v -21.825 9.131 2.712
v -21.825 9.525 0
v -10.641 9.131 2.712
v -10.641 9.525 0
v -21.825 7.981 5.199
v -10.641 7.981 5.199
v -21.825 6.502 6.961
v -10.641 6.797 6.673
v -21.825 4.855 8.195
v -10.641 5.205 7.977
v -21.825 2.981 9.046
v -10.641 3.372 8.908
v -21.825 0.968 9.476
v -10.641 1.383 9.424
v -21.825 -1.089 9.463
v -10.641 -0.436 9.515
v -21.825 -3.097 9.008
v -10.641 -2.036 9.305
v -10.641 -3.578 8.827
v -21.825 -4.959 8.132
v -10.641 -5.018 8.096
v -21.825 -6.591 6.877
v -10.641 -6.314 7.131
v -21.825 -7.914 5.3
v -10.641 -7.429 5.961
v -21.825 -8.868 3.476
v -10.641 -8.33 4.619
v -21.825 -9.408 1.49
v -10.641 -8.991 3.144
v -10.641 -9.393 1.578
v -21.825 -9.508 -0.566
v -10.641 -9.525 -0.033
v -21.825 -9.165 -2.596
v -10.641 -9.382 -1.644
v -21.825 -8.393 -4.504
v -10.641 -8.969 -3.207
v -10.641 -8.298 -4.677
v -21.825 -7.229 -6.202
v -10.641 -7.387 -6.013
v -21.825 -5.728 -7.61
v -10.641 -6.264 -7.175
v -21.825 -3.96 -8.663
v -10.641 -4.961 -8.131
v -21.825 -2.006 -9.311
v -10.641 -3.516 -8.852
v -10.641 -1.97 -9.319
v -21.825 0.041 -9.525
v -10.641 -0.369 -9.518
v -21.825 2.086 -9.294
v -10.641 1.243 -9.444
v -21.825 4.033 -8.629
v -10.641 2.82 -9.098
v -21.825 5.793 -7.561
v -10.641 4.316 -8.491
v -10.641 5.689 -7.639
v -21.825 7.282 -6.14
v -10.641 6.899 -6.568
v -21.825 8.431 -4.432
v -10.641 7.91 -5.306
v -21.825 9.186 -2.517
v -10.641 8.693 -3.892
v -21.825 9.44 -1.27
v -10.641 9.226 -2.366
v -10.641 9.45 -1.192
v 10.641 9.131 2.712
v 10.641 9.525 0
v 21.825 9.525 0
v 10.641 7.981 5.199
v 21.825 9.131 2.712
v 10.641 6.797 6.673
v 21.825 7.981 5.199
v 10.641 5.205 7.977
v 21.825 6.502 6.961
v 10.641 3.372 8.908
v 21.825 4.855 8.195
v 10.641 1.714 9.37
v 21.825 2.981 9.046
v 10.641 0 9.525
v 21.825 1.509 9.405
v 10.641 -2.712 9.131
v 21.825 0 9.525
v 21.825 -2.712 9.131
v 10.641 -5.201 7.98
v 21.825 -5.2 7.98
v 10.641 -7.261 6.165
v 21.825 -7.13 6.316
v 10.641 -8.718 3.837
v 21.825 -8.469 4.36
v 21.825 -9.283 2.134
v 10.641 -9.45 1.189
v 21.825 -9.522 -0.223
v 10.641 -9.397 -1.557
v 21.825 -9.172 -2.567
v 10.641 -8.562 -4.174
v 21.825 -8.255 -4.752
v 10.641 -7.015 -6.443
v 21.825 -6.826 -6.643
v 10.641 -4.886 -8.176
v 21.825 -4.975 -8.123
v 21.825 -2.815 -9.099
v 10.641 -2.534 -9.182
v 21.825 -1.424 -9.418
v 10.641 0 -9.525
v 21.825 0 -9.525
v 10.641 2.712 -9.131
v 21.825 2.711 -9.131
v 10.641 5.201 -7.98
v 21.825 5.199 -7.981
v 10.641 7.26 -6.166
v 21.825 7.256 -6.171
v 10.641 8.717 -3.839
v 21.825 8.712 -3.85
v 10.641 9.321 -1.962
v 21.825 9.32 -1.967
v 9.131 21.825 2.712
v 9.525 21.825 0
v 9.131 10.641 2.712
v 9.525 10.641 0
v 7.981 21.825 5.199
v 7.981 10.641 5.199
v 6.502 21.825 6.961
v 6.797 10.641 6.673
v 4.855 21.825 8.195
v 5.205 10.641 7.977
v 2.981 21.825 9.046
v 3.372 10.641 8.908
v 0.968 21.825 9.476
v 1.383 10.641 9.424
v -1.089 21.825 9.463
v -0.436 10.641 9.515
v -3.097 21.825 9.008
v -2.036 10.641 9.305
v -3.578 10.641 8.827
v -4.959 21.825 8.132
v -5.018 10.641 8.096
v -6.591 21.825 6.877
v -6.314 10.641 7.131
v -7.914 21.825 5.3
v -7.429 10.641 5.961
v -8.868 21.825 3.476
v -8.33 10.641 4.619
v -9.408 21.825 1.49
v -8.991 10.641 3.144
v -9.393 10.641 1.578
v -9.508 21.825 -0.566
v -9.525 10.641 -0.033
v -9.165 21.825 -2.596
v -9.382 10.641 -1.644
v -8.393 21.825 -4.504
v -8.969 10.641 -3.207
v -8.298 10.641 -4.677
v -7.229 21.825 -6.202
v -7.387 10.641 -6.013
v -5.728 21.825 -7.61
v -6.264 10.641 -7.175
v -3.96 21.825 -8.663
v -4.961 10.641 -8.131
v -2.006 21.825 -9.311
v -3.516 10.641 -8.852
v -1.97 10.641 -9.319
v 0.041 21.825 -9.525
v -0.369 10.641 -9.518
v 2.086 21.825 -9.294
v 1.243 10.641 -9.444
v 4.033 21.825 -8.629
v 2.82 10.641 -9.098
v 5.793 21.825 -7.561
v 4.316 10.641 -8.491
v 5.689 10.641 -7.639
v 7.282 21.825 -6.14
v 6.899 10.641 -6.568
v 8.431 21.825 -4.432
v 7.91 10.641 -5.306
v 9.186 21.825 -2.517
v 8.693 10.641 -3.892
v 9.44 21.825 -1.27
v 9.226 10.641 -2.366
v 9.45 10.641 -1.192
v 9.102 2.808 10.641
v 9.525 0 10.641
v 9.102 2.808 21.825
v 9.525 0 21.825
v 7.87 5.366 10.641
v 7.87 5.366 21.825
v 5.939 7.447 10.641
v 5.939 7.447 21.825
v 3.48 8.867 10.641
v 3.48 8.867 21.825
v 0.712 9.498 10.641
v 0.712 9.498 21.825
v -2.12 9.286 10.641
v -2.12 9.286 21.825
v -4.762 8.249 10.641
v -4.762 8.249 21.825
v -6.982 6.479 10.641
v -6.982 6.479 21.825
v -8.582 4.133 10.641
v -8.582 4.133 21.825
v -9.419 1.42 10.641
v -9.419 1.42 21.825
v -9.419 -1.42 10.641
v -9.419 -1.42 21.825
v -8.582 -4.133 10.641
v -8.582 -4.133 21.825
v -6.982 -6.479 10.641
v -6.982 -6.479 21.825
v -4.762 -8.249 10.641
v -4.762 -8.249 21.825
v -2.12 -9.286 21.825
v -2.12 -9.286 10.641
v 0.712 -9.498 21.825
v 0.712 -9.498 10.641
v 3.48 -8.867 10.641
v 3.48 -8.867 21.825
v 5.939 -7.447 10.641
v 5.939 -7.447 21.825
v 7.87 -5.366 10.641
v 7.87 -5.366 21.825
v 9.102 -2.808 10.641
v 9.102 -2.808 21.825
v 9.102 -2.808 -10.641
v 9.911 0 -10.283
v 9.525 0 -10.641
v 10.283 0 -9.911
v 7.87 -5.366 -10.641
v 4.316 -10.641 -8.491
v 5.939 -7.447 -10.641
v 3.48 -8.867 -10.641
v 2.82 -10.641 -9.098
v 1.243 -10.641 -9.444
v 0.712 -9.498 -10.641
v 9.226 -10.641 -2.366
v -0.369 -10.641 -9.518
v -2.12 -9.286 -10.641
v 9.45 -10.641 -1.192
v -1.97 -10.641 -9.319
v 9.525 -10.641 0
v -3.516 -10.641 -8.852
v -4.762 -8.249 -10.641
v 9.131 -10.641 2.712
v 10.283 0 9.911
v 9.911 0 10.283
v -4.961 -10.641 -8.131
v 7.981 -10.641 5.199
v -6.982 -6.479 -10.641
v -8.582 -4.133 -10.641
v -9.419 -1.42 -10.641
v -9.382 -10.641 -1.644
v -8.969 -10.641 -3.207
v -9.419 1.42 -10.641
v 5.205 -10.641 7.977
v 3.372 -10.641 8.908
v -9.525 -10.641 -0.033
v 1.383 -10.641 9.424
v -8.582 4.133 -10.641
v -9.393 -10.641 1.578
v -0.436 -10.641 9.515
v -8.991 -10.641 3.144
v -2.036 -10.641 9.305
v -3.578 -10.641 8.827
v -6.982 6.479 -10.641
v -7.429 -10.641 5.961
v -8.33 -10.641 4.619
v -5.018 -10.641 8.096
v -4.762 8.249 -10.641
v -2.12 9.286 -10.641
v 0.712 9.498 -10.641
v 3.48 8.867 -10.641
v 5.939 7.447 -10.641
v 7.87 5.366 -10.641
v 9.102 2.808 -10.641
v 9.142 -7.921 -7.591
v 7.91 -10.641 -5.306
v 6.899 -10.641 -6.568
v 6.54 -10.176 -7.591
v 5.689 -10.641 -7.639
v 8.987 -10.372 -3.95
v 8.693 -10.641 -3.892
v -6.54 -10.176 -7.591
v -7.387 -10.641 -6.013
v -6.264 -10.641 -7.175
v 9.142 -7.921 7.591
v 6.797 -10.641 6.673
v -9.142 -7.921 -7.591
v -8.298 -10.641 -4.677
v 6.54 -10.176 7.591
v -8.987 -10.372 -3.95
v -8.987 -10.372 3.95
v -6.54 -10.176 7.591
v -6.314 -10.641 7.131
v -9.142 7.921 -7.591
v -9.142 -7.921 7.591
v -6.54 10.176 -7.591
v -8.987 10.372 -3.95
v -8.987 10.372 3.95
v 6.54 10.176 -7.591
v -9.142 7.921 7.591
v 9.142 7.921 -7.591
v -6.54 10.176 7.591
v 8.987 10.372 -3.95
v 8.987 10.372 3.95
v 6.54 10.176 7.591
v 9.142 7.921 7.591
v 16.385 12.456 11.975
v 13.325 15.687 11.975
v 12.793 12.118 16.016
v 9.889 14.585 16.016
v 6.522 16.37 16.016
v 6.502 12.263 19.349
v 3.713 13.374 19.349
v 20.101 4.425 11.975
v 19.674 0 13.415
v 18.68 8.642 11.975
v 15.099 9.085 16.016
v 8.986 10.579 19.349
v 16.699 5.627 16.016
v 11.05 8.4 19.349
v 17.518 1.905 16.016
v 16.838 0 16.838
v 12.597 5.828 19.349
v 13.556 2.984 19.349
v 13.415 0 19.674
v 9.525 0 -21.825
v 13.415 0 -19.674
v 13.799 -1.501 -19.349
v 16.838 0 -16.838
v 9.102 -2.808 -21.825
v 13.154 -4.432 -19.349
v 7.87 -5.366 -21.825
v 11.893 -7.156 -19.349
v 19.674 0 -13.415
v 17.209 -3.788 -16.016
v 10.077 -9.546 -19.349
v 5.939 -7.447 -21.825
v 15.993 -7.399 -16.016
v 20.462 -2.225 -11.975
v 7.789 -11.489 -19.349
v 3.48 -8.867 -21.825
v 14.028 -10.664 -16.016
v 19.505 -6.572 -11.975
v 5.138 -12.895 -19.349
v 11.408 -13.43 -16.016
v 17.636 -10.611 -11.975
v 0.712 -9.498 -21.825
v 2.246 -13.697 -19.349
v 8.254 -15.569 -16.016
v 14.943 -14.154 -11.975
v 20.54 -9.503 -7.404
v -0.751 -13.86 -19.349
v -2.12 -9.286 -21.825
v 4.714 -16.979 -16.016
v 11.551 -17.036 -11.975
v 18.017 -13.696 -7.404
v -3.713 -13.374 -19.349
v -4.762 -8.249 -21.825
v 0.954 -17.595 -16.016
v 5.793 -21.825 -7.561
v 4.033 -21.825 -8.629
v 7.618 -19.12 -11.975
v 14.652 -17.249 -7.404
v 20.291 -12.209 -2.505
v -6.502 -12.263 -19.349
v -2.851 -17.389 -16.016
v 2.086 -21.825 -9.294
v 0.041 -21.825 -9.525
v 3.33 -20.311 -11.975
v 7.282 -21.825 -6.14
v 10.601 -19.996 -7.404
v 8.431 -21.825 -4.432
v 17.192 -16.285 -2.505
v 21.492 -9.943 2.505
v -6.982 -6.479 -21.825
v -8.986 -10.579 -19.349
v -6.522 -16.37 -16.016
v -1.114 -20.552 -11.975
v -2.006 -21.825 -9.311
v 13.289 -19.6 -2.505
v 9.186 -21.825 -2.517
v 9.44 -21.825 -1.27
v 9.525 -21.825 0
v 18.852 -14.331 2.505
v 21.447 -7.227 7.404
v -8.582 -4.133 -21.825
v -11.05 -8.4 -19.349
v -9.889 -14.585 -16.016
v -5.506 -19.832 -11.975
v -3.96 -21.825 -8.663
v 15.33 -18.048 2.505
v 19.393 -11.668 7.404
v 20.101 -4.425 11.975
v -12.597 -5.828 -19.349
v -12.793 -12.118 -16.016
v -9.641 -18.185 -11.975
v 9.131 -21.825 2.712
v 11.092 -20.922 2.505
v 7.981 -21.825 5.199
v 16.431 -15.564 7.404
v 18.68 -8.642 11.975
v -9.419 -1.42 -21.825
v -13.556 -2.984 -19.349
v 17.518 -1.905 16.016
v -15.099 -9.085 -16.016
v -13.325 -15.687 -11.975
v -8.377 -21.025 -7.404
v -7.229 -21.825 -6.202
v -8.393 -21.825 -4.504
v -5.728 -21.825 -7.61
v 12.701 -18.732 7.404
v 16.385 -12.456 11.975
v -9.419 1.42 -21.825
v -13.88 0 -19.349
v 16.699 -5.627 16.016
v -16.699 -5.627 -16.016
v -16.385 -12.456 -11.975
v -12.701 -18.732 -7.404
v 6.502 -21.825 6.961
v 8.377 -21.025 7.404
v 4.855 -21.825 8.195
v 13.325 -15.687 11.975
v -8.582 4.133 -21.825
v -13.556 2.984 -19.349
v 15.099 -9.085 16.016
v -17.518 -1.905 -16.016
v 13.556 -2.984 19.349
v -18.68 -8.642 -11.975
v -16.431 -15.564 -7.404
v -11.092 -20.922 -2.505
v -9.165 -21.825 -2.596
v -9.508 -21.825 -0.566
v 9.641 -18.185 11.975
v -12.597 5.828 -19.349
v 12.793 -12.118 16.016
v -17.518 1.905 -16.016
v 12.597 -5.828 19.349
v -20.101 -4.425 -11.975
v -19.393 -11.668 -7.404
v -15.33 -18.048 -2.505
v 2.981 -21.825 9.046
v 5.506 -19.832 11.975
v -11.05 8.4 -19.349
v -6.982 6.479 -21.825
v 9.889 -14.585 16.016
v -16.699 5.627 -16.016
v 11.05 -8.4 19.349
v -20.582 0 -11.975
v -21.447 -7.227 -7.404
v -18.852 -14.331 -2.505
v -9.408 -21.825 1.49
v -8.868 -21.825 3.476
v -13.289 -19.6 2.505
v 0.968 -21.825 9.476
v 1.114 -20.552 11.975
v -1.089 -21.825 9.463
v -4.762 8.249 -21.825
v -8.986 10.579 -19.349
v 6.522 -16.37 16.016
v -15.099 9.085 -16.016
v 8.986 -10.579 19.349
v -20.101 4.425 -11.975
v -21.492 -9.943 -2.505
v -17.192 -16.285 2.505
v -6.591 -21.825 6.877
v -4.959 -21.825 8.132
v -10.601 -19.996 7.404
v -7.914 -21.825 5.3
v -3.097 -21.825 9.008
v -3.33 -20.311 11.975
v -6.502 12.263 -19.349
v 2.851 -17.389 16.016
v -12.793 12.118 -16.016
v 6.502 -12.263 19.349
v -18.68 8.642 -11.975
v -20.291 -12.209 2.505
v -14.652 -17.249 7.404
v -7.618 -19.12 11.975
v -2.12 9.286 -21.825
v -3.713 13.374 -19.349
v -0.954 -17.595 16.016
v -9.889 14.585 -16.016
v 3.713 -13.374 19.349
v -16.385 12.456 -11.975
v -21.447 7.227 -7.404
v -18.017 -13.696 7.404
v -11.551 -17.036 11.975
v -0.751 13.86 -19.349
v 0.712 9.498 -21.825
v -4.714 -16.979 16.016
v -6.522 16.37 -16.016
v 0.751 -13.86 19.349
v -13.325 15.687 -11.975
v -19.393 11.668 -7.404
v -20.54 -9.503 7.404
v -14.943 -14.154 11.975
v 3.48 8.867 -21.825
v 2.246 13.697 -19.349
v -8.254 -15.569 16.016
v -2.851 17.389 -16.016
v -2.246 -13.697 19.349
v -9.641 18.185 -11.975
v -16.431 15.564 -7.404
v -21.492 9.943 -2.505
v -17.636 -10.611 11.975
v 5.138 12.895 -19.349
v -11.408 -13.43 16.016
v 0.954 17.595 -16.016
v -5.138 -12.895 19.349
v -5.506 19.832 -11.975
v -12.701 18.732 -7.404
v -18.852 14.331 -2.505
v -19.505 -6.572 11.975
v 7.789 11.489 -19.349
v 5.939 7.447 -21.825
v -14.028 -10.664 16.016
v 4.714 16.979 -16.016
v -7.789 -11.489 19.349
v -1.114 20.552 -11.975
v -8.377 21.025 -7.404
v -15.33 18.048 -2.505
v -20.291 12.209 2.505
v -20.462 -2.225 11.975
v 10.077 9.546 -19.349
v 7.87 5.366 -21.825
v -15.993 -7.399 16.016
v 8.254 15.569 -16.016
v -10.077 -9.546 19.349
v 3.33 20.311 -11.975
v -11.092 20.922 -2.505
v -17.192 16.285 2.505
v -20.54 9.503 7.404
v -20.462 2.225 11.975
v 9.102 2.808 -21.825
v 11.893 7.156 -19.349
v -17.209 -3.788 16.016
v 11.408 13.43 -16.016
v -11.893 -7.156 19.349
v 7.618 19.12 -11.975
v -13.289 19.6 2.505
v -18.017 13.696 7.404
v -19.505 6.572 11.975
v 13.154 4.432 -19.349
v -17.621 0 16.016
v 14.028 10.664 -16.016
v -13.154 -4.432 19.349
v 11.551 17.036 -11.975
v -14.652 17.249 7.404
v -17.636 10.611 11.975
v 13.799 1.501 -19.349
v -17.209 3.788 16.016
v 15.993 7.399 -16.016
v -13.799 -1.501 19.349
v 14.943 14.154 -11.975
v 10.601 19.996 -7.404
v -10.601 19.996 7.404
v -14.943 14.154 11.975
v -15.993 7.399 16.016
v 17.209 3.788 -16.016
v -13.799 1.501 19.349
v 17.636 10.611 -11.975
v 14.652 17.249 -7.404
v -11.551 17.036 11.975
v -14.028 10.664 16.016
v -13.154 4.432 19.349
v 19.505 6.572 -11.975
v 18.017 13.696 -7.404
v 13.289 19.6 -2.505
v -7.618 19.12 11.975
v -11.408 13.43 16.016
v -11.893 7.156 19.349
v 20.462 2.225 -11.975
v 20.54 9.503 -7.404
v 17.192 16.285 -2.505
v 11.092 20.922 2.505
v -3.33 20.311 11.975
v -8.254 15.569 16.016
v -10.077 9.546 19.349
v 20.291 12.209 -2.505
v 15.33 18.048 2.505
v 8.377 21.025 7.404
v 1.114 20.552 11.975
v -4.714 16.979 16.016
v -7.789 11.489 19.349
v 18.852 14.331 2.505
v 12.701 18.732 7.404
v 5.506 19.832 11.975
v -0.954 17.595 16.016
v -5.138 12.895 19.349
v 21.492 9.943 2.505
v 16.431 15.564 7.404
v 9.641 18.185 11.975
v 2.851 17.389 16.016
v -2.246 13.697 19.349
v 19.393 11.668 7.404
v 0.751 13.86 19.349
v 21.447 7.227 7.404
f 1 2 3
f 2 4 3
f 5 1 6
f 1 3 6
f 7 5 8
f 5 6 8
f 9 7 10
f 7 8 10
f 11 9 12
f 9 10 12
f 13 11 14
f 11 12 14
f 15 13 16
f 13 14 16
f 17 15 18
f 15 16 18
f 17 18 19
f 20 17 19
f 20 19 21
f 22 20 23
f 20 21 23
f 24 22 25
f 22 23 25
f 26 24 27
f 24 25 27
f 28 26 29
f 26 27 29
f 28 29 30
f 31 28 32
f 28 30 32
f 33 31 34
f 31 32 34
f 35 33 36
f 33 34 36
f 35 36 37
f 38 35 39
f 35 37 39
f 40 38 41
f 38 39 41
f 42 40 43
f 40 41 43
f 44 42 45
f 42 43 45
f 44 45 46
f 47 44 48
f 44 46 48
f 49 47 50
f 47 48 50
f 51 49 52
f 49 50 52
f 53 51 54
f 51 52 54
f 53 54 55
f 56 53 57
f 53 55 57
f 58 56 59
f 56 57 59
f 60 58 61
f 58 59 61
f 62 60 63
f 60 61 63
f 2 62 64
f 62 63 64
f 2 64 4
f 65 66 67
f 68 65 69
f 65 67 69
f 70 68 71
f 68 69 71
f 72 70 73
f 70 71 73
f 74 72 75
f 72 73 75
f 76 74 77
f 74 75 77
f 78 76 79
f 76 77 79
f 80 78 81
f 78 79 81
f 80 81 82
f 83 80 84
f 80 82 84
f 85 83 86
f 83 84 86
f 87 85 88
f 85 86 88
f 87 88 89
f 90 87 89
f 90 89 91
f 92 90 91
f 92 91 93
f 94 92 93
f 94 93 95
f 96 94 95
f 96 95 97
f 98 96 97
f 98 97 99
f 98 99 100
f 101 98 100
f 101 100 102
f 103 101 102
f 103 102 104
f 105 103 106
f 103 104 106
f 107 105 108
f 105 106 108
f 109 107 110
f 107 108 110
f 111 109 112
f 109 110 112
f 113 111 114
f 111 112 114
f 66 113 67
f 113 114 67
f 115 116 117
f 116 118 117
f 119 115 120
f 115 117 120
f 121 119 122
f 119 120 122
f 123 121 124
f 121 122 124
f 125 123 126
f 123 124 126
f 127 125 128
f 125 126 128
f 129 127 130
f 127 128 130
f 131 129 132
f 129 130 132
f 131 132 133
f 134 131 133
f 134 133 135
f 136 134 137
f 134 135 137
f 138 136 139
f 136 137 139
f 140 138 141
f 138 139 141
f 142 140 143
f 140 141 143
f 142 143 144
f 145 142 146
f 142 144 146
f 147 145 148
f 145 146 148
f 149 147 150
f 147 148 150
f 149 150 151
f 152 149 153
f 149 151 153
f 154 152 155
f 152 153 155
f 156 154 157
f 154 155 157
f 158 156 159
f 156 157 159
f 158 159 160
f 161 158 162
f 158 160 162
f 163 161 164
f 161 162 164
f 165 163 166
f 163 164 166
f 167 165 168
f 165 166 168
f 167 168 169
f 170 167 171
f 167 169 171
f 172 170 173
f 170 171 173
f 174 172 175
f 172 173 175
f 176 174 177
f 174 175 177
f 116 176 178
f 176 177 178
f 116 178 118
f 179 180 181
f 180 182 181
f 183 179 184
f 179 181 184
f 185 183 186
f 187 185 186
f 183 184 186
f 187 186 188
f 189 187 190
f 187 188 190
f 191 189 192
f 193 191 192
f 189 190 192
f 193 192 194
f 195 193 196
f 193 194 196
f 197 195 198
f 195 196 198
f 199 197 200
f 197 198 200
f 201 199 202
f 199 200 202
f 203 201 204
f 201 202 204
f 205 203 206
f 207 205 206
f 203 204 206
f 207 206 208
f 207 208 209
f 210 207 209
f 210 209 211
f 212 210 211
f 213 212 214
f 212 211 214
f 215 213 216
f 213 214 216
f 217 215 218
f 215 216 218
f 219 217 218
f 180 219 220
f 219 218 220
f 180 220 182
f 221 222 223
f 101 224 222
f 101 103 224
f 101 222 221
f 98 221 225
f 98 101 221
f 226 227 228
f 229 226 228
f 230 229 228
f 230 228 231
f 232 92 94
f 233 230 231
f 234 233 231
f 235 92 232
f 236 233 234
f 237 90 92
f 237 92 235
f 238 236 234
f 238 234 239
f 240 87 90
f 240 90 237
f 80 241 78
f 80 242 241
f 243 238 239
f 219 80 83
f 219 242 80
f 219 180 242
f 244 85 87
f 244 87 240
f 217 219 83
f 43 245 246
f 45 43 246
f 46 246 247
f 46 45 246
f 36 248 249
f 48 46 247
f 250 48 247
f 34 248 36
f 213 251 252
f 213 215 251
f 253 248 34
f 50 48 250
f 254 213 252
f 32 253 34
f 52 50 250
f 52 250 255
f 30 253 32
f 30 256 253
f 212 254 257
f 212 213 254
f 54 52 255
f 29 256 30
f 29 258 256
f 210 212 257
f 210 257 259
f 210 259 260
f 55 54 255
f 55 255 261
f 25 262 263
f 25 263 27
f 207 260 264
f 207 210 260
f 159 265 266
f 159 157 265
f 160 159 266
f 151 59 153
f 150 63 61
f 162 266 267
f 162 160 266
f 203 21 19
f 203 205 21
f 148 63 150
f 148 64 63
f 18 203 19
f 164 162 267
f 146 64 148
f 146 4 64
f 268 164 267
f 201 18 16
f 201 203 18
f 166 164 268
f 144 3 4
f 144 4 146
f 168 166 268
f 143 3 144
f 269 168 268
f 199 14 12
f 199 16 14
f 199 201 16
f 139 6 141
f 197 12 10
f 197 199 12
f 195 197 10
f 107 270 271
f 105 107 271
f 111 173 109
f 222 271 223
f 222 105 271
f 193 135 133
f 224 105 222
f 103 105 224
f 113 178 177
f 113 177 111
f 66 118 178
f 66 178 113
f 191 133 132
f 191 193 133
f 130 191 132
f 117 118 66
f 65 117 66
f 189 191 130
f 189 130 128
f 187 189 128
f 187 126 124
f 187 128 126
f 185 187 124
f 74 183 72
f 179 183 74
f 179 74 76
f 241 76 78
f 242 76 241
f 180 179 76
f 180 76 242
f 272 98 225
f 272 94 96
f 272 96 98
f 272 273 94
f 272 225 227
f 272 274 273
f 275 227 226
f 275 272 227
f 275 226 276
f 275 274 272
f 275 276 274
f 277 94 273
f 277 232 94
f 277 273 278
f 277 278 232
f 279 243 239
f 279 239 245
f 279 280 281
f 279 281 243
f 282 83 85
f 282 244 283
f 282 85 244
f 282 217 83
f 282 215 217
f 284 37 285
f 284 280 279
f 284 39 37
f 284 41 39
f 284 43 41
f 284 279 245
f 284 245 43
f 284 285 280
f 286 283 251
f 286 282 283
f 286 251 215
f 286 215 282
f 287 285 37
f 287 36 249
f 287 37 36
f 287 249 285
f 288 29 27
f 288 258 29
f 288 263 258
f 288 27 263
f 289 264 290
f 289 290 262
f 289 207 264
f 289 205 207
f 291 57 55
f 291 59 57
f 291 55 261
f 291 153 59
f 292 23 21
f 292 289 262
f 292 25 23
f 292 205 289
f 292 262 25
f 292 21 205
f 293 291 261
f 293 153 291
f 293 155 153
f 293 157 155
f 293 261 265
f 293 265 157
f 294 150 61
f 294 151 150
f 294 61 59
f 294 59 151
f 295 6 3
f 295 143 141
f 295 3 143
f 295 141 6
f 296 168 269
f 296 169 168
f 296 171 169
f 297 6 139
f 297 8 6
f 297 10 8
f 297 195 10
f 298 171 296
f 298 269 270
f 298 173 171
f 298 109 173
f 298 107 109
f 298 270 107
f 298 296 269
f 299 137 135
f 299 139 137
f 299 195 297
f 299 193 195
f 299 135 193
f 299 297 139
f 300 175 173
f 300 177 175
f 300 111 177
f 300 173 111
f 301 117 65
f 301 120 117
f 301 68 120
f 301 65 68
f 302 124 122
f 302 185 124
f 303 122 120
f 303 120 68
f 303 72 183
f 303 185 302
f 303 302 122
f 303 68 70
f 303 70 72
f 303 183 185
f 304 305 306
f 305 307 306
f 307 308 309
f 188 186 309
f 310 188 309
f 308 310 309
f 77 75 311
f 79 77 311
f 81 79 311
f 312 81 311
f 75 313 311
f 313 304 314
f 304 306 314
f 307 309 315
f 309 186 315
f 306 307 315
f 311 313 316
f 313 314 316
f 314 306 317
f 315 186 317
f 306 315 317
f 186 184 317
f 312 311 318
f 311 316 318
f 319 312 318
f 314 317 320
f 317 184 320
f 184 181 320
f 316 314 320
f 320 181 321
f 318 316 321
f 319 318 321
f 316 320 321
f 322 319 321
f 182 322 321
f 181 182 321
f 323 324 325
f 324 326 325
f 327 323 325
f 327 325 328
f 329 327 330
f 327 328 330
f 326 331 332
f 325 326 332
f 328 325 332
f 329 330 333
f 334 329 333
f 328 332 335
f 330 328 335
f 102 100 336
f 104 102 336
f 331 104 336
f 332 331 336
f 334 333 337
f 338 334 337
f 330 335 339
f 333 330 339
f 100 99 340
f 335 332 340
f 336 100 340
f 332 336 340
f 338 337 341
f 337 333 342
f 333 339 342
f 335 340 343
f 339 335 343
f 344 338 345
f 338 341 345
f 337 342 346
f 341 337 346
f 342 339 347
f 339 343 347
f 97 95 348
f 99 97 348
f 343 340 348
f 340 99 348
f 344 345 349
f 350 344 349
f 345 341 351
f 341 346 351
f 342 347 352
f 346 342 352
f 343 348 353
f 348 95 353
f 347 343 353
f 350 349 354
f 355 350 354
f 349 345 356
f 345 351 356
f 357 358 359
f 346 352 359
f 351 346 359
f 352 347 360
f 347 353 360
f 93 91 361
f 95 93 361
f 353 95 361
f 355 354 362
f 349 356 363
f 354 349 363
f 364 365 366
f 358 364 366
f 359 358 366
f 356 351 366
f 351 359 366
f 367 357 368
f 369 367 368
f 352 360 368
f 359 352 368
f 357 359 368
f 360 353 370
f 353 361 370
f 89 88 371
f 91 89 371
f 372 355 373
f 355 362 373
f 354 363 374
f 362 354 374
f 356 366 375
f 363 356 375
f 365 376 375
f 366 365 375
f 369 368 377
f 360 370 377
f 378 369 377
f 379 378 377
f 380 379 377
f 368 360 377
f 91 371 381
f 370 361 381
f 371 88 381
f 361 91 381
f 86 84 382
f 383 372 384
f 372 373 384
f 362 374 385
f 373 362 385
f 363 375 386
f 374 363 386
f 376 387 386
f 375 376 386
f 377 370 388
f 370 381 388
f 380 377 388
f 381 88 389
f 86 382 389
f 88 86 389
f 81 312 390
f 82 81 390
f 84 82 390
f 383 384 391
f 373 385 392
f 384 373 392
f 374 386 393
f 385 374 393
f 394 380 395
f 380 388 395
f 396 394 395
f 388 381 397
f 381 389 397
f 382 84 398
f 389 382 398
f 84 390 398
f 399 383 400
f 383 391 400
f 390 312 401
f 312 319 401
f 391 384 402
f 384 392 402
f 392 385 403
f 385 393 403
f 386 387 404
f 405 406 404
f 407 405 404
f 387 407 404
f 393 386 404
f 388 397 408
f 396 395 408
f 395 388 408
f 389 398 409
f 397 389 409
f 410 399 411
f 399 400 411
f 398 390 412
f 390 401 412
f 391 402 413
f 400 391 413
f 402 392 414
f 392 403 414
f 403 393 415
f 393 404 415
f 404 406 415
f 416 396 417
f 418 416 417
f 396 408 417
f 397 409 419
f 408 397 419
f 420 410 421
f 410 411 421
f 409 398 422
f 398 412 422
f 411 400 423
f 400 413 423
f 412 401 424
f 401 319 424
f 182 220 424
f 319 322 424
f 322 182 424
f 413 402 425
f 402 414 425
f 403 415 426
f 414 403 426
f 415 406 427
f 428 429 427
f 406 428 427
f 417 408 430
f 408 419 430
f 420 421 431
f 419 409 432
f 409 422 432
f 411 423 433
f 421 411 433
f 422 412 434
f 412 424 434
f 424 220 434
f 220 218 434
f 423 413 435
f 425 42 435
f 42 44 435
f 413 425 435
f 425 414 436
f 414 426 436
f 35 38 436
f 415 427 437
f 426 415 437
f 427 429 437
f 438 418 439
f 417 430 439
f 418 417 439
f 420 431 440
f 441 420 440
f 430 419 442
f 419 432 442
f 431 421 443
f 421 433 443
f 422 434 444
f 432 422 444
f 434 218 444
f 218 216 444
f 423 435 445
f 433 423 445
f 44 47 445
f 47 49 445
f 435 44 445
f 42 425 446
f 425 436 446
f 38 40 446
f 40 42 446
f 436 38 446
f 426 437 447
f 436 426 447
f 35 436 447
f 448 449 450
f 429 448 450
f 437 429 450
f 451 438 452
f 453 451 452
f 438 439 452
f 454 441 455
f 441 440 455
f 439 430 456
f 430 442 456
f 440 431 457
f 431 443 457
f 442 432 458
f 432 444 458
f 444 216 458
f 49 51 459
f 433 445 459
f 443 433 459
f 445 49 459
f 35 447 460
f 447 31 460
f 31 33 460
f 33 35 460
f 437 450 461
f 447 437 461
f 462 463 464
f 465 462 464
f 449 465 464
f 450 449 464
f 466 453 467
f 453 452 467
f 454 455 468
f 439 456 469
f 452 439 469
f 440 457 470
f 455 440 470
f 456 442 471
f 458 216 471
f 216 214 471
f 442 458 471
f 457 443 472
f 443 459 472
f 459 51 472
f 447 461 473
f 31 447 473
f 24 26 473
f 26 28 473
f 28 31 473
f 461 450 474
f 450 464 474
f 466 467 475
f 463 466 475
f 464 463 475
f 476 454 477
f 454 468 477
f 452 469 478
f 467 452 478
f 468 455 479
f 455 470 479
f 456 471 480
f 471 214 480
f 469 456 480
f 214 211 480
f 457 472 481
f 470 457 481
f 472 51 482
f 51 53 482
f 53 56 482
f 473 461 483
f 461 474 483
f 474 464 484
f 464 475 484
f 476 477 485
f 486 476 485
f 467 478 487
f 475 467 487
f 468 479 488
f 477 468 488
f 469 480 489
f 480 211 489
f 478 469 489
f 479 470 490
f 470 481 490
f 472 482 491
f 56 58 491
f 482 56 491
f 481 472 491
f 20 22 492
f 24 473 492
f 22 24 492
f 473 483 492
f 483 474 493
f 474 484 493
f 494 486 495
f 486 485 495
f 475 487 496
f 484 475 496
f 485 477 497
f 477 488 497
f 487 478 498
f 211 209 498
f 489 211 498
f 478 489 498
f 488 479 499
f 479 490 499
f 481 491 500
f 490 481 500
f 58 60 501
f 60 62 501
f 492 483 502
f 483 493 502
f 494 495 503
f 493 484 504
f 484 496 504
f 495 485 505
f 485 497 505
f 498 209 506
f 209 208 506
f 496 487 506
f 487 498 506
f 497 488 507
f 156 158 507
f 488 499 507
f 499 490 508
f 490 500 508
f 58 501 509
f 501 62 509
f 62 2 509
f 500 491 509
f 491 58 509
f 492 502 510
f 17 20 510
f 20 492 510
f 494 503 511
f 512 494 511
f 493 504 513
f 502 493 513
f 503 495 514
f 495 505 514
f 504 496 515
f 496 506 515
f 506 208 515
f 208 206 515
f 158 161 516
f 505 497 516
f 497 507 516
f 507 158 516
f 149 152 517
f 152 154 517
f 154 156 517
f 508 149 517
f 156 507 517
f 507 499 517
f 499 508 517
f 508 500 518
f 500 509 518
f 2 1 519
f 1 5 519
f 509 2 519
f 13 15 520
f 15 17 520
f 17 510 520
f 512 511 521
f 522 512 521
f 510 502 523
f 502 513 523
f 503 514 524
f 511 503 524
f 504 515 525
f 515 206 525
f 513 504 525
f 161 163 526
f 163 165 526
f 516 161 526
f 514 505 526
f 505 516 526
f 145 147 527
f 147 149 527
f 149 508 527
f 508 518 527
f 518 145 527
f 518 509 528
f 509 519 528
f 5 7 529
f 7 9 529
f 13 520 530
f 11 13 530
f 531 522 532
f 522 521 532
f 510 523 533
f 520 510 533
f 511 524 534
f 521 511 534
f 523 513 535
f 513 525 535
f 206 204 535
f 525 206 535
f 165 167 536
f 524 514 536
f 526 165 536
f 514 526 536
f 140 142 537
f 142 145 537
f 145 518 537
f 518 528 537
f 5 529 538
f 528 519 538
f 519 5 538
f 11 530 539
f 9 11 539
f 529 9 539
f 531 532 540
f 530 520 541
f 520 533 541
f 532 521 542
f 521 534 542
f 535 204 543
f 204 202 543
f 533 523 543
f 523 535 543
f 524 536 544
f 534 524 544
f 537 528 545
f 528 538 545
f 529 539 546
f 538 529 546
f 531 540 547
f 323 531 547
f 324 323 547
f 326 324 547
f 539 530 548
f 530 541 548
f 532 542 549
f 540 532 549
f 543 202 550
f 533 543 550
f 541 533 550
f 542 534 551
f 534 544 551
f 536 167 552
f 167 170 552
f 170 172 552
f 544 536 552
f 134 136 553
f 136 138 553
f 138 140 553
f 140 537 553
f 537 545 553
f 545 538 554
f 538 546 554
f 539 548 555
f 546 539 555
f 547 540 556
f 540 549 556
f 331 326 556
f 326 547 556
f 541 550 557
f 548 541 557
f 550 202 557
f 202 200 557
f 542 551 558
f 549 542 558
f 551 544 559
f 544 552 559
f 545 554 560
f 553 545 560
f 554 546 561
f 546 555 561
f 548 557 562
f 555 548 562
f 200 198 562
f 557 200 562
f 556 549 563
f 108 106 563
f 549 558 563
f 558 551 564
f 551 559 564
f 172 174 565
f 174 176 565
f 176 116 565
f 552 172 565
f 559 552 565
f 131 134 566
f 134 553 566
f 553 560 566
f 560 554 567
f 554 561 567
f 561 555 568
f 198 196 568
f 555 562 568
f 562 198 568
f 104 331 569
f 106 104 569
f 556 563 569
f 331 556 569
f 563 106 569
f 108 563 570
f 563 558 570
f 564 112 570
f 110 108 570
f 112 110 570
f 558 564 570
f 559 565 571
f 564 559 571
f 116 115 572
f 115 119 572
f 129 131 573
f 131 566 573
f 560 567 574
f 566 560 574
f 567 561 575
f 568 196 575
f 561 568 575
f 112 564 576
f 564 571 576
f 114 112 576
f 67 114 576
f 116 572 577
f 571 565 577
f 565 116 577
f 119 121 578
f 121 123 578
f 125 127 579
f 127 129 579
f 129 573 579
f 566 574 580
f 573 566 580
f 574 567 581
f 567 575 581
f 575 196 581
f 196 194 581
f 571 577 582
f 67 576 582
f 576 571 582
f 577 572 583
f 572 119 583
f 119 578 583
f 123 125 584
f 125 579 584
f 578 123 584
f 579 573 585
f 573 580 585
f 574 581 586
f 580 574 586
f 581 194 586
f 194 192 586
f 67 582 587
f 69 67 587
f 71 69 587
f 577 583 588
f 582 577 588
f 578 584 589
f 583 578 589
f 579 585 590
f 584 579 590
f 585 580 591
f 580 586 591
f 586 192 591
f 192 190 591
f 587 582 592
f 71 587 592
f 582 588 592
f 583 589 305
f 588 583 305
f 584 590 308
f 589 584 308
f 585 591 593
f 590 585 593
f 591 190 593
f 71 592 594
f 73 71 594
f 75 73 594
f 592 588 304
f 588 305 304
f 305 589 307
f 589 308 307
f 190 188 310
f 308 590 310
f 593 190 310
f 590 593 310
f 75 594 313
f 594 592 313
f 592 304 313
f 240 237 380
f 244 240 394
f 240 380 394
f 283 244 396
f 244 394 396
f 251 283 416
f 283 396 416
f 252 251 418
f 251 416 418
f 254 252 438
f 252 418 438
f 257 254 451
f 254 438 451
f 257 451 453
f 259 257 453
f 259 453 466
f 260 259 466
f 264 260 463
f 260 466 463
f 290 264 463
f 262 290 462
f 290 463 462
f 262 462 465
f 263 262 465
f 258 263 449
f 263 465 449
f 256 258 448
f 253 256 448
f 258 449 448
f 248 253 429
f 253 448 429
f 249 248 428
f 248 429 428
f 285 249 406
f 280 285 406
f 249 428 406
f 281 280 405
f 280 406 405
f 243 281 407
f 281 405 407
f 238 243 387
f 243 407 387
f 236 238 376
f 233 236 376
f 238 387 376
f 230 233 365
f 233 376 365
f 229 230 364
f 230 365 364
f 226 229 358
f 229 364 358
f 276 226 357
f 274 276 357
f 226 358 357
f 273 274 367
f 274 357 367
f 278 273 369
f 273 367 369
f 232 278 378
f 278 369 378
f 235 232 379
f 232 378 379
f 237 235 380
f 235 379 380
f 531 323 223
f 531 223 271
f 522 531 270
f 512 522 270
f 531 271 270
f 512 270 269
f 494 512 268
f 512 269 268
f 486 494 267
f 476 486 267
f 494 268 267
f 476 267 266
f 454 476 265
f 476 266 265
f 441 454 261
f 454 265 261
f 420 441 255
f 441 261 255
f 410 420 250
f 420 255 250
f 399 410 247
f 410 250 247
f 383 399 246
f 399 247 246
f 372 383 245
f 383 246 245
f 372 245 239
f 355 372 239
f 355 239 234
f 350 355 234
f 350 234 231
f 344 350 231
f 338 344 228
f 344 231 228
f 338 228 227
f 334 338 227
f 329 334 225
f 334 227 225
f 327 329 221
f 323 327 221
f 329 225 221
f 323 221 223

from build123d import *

# Parameters (mm, degrees)
F4_R     = 9.525
F5_DEPTH = 29.36875
F6_R     = 9.525
F7_DEPTH = 29.36875
F8_R     = 9.525
F9_DEPTH = 29.36875


with BuildPart() as f1:
    # F0 (on Front) → F1 (revolve)
    with BuildSketch(Plane.XZ):
        with BuildLine():
            Line((0, 23.8125), (0, -23.8125))
            ThreePointArc((0, -23.8125), (23.8125, 0), (0, 23.8125))
        make_face()
    revolve(axis=Axis((0, 0, 0), (0, 0, -1)))

    # F2 (on Front) → F3 (revolve, cut)
    with BuildSketch(Plane.XZ):
        with BuildLine():
            Line((0, 14.28115), (0, -14.28115))
            ThreePointArc((0, -14.28115), (14.28115, 0), (0, 14.28115))
        make_face()
    revolve(axis=Axis((0, 0, 0), (0, 0, -1)), mode=Mode.SUBTRACT)

    # F4 (on Front) → F5 (cut, symmetric)
    with BuildSketch(Plane.XZ):
        Circle(F4_R)
    extrude(amount=F5_DEPTH, both=True, mode=Mode.SUBTRACT)

    # F6 (on Right) → F7 (cut, symmetric)
    with BuildSketch(Plane.YZ):
        Circle(F6_R)
    extrude(amount=F7_DEPTH, both=True, mode=Mode.SUBTRACT)

    # F8 (on Top) → F9 (cut, symmetric)
    with BuildSketch(Plane.XY):
        Circle(F8_R)
    extrude(amount=F9_DEPTH, both=True, mode=Mode.SUBTRACT)


solid = f1.part
